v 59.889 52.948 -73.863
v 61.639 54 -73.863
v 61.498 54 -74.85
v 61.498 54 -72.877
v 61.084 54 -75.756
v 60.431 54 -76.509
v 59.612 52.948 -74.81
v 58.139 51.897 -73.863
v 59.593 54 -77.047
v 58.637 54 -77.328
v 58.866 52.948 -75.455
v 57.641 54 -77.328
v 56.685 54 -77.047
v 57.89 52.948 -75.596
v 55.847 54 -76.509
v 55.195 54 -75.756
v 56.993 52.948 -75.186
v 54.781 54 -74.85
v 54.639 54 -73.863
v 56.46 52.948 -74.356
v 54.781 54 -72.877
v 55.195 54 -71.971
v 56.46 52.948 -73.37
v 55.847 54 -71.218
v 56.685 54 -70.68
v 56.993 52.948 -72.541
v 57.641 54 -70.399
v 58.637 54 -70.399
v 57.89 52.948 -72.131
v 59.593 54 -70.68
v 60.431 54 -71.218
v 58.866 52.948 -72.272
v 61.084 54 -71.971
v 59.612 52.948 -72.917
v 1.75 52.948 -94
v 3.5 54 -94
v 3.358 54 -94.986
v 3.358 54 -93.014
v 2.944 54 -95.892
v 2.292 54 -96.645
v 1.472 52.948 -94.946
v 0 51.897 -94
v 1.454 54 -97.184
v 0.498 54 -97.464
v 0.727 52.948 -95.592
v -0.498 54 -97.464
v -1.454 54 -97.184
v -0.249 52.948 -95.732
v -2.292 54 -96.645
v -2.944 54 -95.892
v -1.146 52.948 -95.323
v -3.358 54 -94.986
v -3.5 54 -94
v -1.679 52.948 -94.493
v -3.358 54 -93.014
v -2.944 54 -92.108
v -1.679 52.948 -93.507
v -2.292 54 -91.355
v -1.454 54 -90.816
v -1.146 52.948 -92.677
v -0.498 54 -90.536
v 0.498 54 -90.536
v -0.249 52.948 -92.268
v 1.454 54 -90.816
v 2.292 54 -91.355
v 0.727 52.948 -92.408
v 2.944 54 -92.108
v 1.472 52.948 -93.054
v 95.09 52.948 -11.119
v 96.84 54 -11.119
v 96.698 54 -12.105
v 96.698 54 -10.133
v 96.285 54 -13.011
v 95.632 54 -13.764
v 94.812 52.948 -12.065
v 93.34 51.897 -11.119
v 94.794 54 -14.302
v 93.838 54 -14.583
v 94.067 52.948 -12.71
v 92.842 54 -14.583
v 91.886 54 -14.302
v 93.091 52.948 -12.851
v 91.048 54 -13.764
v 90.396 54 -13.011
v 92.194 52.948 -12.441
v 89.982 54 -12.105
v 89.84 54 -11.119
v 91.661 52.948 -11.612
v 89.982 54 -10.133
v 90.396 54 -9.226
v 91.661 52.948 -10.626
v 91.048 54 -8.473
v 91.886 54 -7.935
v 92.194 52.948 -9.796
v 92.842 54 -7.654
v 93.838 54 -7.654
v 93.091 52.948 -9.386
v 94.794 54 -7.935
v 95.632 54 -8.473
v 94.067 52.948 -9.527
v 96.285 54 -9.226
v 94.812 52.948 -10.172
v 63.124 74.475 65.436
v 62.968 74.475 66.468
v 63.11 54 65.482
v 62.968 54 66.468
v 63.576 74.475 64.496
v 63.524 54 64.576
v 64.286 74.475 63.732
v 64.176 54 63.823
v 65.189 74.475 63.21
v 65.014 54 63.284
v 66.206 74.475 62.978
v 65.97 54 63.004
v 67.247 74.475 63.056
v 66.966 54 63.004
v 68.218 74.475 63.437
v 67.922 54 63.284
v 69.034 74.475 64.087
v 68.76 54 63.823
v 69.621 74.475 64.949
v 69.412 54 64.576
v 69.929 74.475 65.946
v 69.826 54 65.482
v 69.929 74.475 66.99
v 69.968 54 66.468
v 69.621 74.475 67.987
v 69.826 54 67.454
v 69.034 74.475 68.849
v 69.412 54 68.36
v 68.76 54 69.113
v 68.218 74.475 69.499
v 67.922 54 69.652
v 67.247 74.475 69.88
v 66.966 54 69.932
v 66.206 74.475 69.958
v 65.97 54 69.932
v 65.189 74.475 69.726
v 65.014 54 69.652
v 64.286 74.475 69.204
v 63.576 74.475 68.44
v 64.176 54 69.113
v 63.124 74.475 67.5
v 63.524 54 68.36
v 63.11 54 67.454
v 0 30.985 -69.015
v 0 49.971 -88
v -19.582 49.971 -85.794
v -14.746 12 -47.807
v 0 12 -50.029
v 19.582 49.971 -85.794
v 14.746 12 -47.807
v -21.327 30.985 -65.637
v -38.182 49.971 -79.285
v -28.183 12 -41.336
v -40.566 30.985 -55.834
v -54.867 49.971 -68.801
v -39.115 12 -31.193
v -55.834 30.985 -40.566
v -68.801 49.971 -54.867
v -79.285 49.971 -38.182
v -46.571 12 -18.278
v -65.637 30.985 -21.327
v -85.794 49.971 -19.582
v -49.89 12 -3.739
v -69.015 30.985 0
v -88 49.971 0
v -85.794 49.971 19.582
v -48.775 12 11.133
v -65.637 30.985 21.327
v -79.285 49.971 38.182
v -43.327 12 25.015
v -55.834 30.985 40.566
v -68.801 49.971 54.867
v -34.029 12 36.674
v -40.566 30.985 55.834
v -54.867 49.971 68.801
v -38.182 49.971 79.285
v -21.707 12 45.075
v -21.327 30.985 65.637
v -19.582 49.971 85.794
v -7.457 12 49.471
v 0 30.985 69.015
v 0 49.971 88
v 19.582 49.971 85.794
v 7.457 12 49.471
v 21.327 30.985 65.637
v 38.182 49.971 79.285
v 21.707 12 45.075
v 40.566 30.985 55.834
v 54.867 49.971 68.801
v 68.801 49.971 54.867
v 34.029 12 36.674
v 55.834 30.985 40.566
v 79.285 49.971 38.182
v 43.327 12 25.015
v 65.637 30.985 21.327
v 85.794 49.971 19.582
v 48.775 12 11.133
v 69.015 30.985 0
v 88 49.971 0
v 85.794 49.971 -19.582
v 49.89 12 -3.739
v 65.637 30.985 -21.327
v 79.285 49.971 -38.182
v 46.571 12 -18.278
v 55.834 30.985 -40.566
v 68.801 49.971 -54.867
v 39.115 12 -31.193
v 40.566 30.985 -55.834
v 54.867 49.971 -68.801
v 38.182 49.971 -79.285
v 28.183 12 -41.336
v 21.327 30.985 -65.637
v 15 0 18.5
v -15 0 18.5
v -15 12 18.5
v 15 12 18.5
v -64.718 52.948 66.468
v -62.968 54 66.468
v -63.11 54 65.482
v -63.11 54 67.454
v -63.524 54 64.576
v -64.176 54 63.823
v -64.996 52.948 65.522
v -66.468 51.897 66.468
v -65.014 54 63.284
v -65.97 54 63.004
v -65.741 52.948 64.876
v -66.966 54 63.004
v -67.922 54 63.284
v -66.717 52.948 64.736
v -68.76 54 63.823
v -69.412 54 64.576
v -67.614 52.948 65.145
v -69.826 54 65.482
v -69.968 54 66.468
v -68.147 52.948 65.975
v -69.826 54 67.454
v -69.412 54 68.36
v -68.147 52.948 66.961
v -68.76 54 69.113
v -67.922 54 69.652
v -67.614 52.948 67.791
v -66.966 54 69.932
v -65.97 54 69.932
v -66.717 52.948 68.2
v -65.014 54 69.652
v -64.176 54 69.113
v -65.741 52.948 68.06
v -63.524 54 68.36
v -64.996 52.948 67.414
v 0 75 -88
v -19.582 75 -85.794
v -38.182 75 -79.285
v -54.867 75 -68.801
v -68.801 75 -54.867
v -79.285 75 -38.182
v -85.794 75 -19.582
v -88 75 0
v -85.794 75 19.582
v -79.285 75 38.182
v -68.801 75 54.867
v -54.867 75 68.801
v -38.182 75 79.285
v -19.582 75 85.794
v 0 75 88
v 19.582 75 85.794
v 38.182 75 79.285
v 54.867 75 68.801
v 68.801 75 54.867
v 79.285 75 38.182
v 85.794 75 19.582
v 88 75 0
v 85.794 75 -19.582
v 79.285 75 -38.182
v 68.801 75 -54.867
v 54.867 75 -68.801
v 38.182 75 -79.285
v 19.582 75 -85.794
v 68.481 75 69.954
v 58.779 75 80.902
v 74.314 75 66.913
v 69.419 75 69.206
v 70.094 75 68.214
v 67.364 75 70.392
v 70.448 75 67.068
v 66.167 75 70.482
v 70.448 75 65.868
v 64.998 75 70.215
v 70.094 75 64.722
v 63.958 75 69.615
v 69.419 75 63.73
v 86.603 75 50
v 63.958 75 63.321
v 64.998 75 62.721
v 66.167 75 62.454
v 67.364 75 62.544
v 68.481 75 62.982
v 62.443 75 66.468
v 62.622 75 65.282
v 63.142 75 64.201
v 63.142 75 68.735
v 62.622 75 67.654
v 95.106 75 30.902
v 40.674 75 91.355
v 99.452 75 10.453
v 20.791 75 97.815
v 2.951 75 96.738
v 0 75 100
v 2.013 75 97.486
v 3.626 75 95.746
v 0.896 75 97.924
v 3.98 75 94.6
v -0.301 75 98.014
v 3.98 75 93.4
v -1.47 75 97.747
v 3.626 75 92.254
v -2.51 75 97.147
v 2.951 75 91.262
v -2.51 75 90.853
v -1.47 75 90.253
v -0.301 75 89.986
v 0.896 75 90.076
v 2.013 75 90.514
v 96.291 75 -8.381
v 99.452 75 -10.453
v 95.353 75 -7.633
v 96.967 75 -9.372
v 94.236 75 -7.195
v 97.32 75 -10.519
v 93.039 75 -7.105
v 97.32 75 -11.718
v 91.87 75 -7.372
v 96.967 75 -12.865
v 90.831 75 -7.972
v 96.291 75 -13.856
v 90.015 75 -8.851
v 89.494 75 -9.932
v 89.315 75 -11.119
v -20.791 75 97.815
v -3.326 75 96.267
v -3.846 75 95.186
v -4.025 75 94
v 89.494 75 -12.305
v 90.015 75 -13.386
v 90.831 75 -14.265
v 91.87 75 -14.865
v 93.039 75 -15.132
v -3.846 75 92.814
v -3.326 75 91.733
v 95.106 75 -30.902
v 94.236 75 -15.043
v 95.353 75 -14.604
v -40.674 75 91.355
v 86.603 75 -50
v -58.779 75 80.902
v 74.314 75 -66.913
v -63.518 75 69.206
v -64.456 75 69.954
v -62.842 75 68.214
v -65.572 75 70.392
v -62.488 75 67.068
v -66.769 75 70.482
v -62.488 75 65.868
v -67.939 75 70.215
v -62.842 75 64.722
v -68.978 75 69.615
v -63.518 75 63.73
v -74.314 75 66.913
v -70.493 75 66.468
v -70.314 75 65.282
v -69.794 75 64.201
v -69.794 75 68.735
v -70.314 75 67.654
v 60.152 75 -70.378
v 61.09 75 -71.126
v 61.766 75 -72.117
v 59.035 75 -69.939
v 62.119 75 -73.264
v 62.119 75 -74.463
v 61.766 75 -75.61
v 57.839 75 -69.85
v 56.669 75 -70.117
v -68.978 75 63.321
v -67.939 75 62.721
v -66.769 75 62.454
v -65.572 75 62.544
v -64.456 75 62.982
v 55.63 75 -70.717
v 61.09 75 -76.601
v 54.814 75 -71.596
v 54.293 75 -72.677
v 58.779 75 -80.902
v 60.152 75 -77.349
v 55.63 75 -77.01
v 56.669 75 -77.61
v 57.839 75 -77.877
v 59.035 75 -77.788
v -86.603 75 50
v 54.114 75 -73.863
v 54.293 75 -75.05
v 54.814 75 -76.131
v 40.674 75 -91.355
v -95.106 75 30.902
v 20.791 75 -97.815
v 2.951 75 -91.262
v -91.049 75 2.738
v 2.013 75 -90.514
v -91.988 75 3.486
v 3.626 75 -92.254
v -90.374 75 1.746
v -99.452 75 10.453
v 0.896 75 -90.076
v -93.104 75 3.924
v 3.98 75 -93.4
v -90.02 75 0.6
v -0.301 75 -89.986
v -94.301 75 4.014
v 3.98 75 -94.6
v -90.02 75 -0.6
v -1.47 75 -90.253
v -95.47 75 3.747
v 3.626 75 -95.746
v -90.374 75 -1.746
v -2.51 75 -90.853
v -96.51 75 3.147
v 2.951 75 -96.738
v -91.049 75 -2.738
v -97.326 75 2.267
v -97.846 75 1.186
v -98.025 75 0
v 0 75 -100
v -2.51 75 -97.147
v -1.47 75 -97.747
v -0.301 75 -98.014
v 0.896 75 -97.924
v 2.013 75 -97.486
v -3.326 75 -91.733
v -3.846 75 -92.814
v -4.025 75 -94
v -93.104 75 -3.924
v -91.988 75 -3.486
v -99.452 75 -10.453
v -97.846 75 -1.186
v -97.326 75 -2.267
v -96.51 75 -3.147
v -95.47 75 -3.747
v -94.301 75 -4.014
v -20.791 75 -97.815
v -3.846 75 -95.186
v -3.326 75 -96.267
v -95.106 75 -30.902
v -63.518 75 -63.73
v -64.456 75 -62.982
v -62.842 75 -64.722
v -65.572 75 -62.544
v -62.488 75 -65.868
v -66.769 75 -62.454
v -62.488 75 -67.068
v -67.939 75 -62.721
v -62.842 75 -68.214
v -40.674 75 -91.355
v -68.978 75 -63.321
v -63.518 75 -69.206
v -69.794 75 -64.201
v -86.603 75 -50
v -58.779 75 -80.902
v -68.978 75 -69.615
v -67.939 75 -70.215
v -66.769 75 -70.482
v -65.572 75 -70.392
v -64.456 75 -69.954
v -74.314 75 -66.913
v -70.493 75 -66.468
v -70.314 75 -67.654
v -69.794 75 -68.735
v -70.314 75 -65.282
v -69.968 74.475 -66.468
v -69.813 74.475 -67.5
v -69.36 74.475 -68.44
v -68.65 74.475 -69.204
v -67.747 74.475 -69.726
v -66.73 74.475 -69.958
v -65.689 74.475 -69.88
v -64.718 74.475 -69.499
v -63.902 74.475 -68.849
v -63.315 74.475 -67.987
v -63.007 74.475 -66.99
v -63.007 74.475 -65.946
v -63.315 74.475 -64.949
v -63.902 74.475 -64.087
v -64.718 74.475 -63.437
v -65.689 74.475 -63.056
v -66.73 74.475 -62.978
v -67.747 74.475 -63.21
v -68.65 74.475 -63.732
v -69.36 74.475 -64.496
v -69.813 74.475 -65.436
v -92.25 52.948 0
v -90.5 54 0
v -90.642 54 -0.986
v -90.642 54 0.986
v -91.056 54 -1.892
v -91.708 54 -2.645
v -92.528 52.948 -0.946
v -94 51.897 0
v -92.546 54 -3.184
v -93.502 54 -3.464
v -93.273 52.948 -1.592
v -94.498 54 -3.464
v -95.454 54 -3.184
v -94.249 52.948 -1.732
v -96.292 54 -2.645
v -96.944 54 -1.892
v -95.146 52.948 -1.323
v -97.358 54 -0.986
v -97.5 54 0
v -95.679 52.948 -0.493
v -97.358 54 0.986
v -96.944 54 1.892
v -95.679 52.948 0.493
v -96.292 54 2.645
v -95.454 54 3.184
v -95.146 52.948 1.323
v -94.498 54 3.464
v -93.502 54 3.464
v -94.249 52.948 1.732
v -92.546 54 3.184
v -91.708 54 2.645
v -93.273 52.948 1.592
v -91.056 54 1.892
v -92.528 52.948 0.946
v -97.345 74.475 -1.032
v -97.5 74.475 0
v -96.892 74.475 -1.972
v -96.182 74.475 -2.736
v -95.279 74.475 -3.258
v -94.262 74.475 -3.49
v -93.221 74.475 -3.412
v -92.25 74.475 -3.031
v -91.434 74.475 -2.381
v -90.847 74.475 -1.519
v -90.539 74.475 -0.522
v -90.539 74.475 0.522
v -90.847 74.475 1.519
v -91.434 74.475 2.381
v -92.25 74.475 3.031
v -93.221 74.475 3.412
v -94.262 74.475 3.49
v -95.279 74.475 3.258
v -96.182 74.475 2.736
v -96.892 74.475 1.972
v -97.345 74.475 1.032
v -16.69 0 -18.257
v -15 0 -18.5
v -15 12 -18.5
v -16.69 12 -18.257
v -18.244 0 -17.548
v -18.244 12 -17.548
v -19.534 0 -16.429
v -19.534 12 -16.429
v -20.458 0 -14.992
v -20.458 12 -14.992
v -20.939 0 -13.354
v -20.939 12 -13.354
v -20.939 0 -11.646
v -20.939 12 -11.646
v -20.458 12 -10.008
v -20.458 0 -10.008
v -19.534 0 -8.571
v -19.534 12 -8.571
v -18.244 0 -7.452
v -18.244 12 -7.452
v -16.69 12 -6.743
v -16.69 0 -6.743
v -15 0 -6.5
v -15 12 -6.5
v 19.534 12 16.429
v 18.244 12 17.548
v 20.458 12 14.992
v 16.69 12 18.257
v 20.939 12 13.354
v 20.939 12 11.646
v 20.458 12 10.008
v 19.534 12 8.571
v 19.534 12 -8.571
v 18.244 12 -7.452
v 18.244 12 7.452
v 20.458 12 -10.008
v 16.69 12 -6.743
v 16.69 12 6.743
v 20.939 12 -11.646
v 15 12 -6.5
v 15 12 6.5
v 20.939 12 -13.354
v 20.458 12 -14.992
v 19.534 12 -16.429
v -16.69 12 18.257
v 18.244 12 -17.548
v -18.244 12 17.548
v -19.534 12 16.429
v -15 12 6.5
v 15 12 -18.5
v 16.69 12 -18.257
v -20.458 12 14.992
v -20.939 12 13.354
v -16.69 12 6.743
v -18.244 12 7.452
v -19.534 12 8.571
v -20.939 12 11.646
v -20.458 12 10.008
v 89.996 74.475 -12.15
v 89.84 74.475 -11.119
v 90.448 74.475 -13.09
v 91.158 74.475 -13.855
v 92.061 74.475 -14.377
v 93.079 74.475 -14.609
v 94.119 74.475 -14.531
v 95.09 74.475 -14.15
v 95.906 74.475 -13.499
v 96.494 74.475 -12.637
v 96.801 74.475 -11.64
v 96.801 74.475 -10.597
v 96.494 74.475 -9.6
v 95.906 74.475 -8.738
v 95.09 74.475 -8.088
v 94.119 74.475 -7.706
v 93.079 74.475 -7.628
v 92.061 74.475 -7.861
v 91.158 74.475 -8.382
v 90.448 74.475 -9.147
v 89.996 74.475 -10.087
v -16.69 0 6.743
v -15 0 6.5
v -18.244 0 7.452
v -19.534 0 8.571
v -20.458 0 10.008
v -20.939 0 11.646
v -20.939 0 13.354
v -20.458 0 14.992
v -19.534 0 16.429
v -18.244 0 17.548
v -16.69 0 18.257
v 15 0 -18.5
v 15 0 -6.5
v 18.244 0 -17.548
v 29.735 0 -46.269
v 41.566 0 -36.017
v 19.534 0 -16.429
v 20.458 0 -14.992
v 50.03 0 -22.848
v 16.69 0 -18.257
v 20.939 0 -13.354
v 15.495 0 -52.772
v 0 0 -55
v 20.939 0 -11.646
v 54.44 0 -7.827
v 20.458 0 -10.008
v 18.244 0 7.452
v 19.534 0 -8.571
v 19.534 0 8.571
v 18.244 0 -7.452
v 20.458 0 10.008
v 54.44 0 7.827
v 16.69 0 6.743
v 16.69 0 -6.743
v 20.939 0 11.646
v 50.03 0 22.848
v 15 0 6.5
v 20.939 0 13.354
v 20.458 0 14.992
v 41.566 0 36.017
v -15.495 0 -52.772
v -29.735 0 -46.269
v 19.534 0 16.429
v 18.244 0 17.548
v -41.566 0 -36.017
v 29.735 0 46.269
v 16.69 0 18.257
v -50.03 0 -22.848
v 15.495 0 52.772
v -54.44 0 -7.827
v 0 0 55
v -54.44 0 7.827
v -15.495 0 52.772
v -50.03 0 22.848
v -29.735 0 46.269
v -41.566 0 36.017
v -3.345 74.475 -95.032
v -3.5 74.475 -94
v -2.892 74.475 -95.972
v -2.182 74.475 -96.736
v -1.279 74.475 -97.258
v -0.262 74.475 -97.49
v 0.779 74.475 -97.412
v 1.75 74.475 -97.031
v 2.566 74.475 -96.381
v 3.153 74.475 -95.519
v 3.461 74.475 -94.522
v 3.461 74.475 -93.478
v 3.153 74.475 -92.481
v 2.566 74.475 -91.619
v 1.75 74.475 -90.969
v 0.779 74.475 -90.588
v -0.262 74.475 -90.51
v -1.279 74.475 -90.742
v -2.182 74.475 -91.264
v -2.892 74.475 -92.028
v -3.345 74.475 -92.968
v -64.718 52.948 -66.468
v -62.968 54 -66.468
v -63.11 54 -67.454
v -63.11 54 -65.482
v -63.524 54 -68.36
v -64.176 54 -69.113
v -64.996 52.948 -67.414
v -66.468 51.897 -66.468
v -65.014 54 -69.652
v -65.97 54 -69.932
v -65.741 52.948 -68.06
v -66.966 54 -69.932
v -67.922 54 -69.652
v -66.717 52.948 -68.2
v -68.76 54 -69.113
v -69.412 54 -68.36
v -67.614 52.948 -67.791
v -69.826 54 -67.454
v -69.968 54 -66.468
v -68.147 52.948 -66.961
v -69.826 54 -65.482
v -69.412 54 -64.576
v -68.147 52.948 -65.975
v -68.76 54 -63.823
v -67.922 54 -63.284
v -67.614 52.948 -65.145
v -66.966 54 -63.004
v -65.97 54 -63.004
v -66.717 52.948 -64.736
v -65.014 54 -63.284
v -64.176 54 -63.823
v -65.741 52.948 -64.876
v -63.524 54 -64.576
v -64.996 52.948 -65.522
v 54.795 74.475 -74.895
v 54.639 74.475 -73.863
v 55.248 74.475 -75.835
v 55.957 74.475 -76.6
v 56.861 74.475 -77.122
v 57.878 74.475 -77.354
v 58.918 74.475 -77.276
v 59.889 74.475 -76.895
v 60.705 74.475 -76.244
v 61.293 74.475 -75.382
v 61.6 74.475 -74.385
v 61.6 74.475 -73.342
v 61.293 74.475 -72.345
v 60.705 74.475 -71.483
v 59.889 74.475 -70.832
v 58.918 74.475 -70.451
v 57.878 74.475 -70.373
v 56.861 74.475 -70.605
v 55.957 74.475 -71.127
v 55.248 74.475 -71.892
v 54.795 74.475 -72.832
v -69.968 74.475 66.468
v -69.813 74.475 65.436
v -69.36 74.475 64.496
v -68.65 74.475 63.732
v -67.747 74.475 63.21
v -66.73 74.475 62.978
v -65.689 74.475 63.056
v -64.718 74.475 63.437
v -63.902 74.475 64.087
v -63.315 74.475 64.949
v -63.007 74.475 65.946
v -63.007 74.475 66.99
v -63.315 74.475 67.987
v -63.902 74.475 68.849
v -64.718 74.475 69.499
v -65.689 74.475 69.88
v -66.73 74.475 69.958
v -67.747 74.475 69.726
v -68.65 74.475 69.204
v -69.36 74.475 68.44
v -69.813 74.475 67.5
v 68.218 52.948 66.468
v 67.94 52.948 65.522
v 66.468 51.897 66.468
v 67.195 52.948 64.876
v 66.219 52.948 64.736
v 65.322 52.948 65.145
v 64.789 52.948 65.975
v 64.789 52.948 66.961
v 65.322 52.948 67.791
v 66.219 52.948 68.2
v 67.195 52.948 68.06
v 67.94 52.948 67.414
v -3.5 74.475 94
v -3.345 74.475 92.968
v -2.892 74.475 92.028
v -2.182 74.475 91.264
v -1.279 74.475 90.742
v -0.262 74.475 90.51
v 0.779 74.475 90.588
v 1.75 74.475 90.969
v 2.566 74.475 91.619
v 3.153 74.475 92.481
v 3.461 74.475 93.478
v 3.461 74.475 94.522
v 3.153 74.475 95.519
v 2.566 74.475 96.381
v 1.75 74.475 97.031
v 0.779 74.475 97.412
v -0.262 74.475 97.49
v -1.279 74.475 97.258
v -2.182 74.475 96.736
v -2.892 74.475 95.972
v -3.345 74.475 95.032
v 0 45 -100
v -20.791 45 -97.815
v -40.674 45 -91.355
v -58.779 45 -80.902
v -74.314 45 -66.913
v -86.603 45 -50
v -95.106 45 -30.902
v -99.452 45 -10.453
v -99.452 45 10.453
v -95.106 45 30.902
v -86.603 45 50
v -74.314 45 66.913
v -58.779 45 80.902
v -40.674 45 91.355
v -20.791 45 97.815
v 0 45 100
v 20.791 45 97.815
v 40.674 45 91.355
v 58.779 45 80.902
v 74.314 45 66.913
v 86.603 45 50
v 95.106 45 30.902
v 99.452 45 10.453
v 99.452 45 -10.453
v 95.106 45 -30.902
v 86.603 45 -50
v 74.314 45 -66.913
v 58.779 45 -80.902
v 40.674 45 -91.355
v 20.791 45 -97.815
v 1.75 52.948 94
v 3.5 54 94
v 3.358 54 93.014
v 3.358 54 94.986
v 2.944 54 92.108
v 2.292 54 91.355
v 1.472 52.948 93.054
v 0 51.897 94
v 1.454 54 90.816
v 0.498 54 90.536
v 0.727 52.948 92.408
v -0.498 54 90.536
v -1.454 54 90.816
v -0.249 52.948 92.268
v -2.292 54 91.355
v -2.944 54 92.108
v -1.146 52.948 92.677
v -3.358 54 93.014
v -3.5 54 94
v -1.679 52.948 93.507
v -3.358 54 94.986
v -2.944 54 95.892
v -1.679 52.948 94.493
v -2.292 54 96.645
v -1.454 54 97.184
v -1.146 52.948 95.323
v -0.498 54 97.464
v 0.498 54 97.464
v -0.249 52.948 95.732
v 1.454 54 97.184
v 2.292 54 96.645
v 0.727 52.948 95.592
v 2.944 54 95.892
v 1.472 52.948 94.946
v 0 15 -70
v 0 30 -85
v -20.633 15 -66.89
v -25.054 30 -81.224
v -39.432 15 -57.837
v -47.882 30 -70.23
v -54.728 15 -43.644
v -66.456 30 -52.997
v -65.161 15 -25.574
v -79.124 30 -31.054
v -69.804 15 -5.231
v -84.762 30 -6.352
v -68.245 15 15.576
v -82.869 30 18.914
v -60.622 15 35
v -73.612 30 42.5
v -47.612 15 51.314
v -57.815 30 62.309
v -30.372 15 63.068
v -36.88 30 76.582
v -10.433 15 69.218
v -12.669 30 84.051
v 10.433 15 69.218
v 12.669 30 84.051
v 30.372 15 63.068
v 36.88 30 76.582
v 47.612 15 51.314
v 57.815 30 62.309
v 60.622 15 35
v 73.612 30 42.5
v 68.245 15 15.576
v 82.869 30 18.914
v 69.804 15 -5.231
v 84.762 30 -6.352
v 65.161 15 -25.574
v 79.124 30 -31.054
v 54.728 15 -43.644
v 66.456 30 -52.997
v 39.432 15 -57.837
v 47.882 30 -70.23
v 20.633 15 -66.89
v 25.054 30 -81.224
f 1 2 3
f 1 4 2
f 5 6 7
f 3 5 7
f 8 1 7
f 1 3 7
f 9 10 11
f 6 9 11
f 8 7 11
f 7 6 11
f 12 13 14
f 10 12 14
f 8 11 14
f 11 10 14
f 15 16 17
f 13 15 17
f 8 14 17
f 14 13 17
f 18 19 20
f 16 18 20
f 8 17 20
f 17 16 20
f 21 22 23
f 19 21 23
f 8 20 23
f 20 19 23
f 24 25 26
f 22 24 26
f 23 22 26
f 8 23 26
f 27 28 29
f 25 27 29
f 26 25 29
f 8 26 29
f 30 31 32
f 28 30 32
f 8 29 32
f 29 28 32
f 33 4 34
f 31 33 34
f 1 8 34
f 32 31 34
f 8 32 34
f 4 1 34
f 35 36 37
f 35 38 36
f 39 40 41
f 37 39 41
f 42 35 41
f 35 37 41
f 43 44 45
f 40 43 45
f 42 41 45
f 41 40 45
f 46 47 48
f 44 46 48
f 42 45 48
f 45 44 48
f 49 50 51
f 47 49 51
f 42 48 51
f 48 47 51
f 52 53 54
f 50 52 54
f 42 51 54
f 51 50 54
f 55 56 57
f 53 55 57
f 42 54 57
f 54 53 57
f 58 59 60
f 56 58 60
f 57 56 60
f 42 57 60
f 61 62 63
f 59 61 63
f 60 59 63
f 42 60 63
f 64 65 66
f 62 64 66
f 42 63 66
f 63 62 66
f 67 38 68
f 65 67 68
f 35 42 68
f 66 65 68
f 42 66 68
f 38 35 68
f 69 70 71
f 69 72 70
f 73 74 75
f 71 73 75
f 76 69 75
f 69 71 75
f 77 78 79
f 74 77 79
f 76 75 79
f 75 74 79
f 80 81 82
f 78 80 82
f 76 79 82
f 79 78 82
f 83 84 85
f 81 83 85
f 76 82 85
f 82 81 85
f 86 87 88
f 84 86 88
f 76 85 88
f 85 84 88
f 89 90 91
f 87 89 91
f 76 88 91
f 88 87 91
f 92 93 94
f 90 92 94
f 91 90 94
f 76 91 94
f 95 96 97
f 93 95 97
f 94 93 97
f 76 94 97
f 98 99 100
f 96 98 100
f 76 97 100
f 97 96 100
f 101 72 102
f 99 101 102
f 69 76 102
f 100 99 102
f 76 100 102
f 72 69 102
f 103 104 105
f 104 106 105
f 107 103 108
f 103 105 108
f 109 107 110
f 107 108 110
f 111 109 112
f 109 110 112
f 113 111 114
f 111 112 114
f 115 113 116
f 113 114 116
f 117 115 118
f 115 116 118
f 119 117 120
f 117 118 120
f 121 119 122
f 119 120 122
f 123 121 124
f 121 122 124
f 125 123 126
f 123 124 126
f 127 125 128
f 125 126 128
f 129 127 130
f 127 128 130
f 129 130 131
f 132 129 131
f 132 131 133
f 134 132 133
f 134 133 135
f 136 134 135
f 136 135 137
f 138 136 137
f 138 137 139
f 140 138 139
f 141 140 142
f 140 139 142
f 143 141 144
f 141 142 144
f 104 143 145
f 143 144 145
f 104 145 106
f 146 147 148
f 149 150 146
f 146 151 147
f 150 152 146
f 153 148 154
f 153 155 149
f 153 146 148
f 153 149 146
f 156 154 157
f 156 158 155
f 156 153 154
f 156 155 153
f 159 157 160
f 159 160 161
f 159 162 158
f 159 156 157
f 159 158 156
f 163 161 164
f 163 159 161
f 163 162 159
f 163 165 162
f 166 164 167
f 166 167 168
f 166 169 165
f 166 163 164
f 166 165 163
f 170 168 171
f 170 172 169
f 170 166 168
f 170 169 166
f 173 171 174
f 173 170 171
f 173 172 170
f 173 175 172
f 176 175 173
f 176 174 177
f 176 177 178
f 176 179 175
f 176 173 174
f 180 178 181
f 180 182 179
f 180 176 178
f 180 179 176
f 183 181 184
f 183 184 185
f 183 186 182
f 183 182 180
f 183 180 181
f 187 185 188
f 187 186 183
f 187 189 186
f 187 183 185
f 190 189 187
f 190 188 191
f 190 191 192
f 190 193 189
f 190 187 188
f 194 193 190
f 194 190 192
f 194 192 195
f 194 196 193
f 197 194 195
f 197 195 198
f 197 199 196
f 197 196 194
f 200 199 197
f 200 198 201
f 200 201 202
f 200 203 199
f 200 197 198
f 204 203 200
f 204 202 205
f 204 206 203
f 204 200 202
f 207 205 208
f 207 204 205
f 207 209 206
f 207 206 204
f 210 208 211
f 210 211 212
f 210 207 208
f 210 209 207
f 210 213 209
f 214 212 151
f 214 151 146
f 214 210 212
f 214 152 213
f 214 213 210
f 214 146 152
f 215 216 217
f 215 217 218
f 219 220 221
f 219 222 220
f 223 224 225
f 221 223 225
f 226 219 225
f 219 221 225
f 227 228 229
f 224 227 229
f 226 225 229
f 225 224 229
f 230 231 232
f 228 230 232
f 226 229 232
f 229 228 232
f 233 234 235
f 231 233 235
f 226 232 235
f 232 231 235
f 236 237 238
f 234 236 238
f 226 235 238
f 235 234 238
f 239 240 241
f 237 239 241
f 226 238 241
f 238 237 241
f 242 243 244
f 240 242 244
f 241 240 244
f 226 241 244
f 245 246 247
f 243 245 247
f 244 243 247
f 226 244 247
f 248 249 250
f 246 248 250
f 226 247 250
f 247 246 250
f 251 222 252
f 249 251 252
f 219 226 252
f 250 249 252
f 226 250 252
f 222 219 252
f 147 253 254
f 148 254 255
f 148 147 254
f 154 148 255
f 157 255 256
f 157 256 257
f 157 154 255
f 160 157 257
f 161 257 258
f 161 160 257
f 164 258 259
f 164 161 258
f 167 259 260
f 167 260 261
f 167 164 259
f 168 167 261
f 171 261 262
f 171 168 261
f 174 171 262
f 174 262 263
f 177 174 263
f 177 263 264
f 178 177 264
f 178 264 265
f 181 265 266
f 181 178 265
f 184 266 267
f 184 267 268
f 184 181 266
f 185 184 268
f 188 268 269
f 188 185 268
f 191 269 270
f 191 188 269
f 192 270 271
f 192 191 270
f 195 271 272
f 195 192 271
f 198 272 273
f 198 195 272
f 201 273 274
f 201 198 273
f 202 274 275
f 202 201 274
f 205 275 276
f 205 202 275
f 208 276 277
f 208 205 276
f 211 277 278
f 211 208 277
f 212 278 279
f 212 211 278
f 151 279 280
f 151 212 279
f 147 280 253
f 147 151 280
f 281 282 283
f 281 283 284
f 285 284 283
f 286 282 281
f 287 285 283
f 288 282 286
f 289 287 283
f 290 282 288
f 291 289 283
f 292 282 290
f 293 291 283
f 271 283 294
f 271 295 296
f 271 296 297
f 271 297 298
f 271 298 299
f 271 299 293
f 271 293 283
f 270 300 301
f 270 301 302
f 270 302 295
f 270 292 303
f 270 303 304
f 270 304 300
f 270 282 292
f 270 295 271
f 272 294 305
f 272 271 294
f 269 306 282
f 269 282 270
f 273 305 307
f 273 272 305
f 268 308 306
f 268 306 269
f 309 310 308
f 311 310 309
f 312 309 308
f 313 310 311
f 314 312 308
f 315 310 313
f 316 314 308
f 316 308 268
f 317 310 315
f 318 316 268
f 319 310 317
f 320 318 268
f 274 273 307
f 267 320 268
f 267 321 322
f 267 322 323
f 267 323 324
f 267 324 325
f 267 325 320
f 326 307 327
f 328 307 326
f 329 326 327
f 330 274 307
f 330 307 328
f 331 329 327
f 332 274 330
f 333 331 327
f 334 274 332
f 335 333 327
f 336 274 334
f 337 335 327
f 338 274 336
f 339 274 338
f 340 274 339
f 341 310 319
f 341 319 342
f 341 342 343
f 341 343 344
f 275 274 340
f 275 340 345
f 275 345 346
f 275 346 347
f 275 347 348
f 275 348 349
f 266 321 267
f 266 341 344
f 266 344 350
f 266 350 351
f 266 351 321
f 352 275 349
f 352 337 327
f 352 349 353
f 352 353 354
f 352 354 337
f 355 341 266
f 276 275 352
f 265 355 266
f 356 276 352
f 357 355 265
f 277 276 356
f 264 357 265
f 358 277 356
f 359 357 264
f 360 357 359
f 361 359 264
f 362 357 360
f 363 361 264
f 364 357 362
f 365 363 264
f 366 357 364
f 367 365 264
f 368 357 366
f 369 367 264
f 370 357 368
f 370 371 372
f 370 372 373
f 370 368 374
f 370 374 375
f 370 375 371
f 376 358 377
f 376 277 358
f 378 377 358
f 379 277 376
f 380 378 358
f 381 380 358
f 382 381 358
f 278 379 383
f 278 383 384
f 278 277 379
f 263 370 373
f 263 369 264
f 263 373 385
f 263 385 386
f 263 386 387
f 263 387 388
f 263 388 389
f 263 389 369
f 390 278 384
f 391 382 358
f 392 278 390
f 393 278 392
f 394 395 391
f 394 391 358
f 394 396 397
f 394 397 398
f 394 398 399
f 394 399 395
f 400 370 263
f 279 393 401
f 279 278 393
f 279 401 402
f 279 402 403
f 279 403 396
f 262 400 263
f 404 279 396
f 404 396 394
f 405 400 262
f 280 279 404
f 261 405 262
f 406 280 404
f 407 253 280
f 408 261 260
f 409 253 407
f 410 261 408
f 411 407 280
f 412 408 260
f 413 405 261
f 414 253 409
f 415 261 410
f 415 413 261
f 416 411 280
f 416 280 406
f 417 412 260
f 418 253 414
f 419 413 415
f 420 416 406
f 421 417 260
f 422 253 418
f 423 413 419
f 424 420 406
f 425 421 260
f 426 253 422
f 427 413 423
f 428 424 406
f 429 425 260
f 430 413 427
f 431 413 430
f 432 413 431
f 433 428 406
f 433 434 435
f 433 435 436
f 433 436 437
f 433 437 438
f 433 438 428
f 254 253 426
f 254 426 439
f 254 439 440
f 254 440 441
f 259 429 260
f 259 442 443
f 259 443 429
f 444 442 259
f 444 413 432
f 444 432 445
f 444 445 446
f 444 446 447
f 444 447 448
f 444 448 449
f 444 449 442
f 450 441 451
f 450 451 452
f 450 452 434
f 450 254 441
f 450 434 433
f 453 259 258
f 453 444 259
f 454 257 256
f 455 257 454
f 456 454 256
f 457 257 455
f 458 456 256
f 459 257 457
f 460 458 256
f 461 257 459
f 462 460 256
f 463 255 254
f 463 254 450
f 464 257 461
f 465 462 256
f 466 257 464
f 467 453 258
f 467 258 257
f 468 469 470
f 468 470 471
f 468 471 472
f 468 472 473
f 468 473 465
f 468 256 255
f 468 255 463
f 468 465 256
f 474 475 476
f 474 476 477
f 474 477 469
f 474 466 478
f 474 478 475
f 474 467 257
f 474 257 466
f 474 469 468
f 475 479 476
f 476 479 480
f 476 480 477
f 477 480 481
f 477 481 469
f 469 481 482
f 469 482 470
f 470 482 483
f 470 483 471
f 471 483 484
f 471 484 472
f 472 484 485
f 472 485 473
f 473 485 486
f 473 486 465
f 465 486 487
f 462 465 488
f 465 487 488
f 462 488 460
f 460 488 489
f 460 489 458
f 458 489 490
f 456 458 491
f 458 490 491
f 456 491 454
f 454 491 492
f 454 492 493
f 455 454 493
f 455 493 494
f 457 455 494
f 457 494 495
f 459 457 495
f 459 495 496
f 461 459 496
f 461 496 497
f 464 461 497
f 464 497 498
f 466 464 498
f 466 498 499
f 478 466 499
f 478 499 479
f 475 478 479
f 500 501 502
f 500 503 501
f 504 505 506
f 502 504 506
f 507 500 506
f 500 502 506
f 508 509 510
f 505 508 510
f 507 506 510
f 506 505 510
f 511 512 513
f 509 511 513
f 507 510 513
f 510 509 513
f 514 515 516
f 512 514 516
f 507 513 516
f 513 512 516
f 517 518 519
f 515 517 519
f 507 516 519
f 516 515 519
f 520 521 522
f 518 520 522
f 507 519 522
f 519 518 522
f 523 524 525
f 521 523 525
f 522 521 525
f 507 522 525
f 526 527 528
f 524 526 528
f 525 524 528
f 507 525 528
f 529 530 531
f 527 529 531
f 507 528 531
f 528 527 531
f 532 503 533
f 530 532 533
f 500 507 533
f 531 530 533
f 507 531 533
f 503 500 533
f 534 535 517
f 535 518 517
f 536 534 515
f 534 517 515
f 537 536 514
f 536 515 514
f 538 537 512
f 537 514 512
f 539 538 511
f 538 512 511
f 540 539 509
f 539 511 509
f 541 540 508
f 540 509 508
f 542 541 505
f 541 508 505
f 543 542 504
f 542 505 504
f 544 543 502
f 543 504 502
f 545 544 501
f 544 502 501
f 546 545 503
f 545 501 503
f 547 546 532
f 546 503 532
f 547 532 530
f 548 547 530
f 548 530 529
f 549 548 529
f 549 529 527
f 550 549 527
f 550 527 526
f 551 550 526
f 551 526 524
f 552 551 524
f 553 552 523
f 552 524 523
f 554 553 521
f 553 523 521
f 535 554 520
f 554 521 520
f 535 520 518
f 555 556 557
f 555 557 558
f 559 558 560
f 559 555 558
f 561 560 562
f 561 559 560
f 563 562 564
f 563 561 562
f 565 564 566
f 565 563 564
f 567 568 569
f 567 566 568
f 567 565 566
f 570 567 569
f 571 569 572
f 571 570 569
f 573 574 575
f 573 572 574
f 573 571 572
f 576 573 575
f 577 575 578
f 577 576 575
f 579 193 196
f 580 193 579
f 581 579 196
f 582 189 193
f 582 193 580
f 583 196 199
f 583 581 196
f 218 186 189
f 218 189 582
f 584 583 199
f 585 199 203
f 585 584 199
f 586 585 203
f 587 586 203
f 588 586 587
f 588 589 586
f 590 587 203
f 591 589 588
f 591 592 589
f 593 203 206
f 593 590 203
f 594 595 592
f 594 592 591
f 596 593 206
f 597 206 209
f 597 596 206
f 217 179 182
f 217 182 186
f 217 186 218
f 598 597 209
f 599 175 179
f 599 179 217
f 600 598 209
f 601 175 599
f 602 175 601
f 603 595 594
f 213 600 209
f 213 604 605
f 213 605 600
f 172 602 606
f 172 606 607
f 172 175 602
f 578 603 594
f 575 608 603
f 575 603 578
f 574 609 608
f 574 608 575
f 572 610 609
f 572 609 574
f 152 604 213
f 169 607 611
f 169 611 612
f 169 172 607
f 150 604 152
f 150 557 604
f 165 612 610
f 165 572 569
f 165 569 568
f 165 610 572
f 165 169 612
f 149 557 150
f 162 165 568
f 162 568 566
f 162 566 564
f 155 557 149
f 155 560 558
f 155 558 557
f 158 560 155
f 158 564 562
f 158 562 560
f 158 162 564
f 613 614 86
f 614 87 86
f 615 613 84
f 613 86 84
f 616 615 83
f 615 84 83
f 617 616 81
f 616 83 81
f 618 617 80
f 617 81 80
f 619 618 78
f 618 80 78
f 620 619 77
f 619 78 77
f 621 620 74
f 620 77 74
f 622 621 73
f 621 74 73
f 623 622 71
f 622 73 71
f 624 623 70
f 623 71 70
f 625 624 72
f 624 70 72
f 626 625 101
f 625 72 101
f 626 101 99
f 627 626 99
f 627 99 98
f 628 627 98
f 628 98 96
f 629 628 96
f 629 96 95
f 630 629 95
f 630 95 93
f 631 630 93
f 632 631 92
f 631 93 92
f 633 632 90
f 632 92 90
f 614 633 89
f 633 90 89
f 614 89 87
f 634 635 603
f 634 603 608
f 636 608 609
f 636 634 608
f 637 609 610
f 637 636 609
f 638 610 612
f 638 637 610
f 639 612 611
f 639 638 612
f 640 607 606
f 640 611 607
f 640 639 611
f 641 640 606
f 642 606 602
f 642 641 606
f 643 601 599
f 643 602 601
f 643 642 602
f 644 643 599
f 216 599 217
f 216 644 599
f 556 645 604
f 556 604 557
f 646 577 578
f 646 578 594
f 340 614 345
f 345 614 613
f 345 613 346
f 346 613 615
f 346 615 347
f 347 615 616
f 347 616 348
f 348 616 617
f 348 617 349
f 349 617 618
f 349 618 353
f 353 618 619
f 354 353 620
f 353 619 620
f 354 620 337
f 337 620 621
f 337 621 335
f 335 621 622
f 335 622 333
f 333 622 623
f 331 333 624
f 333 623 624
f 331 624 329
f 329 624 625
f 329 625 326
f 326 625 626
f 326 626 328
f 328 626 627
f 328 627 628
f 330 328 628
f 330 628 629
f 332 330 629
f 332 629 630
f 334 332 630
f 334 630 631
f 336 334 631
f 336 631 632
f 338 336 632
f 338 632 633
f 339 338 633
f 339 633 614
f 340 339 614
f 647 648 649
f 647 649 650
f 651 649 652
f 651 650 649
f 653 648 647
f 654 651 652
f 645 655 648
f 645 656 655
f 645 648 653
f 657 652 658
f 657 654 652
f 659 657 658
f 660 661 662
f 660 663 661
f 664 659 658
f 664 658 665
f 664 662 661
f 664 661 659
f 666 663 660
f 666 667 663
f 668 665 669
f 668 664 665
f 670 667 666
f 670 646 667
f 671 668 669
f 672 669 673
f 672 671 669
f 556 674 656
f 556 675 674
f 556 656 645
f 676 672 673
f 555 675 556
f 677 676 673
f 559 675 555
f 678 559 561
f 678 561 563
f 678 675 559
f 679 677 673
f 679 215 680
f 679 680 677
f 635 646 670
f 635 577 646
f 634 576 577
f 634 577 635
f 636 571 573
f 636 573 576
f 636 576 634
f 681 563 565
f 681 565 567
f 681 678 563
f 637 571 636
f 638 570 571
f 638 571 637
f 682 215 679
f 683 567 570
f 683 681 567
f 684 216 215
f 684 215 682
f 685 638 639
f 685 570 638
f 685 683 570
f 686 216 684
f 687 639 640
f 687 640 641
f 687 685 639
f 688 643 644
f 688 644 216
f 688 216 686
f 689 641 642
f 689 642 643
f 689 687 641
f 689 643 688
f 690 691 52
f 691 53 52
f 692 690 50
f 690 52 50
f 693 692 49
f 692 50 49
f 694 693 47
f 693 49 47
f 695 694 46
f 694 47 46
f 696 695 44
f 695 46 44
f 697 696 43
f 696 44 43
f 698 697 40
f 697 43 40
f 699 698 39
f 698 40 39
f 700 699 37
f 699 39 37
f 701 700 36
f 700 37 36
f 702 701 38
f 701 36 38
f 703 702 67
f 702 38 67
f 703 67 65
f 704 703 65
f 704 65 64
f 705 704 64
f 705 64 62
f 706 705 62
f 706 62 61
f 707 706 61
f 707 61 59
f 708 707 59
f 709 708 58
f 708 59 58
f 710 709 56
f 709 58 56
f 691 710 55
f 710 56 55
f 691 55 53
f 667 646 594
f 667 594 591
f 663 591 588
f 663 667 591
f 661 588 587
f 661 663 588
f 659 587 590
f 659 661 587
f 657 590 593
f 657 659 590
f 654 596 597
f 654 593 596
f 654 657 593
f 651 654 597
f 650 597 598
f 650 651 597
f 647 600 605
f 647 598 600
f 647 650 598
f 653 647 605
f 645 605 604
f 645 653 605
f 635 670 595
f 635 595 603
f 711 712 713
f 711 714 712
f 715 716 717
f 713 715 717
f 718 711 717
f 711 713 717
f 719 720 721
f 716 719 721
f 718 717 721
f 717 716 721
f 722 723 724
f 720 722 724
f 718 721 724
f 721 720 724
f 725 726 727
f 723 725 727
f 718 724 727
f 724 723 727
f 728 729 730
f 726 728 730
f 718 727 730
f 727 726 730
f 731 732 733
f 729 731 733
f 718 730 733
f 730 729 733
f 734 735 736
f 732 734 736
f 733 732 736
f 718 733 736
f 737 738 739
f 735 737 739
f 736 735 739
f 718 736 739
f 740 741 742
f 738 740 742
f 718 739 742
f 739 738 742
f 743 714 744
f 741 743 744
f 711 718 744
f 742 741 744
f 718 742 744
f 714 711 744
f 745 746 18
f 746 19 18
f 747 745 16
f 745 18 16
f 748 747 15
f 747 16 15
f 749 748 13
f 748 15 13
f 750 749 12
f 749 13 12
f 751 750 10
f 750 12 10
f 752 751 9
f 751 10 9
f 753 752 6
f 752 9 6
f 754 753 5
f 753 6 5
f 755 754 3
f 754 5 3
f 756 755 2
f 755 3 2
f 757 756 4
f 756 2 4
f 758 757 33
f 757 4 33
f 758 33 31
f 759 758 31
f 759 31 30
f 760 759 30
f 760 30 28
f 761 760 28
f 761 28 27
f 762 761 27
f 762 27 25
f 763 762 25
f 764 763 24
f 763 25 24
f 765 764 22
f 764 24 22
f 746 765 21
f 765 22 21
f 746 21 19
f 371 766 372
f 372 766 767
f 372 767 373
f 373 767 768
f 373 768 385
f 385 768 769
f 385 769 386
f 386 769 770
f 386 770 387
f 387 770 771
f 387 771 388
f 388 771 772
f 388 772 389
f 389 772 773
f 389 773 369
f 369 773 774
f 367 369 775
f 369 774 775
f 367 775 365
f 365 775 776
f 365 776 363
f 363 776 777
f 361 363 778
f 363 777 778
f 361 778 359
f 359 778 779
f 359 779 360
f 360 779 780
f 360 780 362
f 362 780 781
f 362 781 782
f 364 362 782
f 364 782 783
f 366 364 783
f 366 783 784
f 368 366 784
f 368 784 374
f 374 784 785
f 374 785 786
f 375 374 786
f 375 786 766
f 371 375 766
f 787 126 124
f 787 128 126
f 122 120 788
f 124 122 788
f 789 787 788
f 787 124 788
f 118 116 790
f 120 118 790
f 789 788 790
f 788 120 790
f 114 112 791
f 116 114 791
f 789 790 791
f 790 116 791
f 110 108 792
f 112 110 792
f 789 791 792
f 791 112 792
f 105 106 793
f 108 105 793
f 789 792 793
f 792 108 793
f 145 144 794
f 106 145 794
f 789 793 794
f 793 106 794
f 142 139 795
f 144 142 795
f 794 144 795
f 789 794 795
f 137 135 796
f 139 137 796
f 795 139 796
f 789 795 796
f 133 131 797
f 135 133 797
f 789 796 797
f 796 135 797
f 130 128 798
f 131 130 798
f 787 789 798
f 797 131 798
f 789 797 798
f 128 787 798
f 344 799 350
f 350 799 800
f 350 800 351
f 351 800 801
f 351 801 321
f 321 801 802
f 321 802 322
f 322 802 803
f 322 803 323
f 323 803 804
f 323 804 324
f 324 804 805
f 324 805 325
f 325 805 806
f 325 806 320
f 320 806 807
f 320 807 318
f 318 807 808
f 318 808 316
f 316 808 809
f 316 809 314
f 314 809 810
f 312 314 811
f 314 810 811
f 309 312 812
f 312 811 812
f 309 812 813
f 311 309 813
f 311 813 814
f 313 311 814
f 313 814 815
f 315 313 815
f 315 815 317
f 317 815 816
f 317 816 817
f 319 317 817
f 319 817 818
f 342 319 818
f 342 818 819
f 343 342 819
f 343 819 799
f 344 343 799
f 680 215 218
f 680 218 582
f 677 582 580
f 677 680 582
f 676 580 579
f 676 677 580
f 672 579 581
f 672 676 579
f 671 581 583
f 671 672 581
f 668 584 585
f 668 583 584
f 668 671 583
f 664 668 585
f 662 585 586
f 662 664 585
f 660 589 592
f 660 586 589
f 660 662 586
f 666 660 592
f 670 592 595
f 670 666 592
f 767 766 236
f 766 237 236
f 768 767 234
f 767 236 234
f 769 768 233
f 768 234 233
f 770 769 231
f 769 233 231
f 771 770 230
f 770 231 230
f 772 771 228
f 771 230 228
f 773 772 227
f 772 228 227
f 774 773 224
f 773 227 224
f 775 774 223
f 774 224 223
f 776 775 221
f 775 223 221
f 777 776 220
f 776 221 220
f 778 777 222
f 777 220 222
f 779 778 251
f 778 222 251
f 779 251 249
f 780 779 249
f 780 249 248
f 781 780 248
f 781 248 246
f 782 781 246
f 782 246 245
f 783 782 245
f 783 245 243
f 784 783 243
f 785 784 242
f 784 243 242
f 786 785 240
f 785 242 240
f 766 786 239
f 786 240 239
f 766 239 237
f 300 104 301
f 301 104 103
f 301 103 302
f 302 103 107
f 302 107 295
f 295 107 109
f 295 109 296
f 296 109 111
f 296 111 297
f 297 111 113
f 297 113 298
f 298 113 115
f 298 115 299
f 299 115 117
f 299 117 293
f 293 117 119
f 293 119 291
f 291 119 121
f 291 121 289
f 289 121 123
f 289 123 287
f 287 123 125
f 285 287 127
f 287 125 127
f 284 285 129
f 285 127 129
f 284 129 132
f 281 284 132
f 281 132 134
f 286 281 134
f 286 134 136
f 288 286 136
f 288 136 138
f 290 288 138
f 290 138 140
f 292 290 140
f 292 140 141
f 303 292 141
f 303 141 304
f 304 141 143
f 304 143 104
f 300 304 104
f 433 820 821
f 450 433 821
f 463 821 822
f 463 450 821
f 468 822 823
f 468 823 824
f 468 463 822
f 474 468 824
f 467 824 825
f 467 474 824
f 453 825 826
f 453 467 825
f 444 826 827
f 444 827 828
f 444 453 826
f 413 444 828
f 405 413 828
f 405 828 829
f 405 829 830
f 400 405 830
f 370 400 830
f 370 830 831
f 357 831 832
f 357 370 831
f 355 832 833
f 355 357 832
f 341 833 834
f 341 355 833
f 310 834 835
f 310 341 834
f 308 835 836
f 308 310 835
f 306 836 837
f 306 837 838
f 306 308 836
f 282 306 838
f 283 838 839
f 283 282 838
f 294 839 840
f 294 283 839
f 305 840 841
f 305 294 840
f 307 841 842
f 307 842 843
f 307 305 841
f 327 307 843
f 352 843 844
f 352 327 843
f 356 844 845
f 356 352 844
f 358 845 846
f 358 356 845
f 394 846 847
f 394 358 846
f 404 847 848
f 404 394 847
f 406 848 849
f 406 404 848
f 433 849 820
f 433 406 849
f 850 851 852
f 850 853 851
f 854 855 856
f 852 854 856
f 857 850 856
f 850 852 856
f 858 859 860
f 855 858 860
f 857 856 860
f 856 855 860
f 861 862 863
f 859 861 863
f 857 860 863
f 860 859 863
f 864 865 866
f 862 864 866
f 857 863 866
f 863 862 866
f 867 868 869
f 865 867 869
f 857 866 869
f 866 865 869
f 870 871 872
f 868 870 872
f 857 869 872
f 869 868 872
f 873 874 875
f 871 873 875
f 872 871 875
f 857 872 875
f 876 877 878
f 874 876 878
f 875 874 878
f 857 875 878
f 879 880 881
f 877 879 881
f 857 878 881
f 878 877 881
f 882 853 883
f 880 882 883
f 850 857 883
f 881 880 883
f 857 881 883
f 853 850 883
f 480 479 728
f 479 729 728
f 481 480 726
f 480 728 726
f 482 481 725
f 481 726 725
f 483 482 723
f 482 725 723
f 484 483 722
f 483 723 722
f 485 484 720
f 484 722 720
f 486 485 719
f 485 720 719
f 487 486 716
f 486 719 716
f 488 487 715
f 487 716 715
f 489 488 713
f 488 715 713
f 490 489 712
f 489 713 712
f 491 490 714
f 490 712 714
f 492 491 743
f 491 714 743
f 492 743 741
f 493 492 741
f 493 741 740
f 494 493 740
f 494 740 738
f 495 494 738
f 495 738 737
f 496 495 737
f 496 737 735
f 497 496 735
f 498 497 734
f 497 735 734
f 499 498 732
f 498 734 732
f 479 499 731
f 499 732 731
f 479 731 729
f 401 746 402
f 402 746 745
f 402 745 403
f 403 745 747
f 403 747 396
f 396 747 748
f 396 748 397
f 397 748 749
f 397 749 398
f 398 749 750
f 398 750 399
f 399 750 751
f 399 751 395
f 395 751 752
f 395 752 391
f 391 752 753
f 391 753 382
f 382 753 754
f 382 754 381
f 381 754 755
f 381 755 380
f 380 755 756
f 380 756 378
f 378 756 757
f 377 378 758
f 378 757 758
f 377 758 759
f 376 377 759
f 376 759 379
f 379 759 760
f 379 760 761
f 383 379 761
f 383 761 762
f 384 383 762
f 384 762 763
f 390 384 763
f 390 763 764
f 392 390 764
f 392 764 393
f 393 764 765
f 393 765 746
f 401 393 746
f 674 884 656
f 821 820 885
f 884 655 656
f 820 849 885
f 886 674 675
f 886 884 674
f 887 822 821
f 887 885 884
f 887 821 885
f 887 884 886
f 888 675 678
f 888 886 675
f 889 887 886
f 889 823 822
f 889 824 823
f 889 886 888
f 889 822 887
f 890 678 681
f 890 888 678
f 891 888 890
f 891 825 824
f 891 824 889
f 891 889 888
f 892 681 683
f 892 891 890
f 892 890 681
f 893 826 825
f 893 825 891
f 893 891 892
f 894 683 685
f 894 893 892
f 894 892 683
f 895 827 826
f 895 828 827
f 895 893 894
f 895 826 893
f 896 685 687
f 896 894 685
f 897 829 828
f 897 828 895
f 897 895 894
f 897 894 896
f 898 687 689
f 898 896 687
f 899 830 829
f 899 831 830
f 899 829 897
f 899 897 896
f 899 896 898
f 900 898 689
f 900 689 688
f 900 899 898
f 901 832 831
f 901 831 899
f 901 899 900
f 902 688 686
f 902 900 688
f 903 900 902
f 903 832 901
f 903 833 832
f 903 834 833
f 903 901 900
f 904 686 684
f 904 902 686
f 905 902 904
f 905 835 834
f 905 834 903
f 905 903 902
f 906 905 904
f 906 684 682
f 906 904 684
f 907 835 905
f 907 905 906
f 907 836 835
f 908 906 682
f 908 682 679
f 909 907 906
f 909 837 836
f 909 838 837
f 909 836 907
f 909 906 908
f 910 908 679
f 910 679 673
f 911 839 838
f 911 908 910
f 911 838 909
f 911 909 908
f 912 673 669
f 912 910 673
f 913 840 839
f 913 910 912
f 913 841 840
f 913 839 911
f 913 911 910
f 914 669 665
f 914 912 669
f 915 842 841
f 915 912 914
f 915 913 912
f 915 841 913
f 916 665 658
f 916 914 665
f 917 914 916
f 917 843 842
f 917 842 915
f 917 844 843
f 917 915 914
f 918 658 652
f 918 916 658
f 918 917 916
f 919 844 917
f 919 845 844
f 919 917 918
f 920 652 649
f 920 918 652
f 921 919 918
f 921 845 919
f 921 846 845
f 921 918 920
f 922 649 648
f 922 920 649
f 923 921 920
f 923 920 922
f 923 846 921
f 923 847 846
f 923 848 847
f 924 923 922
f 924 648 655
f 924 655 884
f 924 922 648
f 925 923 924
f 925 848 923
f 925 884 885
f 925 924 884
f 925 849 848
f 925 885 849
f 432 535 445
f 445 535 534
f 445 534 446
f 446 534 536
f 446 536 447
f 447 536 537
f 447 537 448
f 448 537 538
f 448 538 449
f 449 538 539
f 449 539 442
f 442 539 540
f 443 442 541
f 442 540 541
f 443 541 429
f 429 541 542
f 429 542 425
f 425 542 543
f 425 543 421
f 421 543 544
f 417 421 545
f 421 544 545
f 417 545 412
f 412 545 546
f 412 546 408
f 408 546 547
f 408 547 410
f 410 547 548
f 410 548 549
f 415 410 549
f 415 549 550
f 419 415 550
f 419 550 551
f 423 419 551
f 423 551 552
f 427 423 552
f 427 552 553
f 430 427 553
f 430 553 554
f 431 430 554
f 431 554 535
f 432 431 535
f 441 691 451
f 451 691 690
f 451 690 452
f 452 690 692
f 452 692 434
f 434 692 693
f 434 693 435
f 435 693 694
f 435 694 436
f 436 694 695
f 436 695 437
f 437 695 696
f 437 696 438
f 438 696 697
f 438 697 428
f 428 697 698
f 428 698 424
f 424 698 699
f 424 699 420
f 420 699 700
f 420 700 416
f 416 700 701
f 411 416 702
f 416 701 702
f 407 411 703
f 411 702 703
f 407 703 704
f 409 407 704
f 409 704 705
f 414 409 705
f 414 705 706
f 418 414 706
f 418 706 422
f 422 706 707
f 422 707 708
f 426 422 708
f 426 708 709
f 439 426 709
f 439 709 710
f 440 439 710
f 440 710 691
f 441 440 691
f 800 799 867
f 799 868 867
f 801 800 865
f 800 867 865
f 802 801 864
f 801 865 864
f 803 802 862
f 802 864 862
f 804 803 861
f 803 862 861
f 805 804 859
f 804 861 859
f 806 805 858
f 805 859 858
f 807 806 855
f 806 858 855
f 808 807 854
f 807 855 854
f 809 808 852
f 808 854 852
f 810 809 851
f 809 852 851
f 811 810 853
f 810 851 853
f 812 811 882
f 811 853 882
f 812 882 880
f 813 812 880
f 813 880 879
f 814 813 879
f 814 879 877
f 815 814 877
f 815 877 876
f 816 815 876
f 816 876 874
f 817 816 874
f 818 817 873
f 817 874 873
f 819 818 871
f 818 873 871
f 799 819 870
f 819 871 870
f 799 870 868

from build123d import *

# Parameters (mm, degrees)
CUT_EXTRUDE1_DEPTH              = 161.078105936
M8X1_0_TAPPED_HOLE2_D           = 7
M8X1_0_TAPPED_HOLE2_DEPTH       = 21
M8X1_0_TAPPED_HOLE2_CSINK_D     = 8.05
M8X1_0_TAPPED_HOLE2_CSINK_ANGLE = 90
M8X1_0_TAPPED_HOLE2_TIP         = 2.103012167


with BuildPart() as part:
    # Sketch2 → Revolve1 (revolve)
    with BuildSketch(Plane.XY, mode=Mode.PRIVATE) as revolve1_sk:
        Polygon((55, 0), (100, 45), (100, 75), (88, 75), (88, 49.970562748), (50.029437252, 12), (0, 12), (0, 0), align=None)
    revolve(revolve1_sk.sketch.rotate(Axis((0, 0, 0), (0, 1, 0)), 90), axis=Axis((0, 0, 0), (0, 1, 0)))

    # Sketch3 → Cut-Extrude1 (cut, through all)
    with BuildSketch(Plane.XZ):
        with BuildLine():
            Line((-15, 18.5), (15, 18.5))
            ThreePointArc((15, 18.5), (21, 12.5), (15, 6.5))
            Line((15, 6.5), (-15, 6.5))
            ThreePointArc((-15, 6.5), (-21, 12.5), (-15, 18.5))
        make_face()
        with BuildLine():
            Line((-15, -6.5), (15, -6.5))
            ThreePointArc((15, -6.5), (21, -12.5), (15, -18.5))
            Line((15, -18.5), (-15, -18.5))
            ThreePointArc((-15, -18.5), (-21, -12.5), (-15, -6.5))
        make_face()
    extrude(amount=-CUT_EXTRUDE1_DEPTH, mode=Mode.SUBTRACT)

    # M8x1.0 Tapped Hole2
    with Locations(Plane(origin=(0, 75, 0), x_dir=(1, 0, 0), z_dir=(0, 1, 0))):
        with Locations((0, 94), (58.139395742, 73.863459591), (93.340114142, 11.118592175), (66.468037432, -66.468037432), (0, -94), (-66.468037432, -66.468037432), (-94, 0), (-66.468037432, 66.468037432)):
            CounterSinkHole(M8X1_0_TAPPED_HOLE2_D / 2, M8X1_0_TAPPED_HOLE2_CSINK_D / 2, depth=M8X1_0_TAPPED_HOLE2_DEPTH, counter_sink_angle=M8X1_0_TAPPED_HOLE2_CSINK_ANGLE)
            with Locations((0, 0, -(M8X1_0_TAPPED_HOLE2_DEPTH + M8X1_0_TAPPED_HOLE2_TIP / 2))):  # 118° drill point
                Cone(0, M8X1_0_TAPPED_HOLE2_D / 2, M8X1_0_TAPPED_HOLE2_TIP, mode=Mode.SUBTRACT)


solid = part.part
